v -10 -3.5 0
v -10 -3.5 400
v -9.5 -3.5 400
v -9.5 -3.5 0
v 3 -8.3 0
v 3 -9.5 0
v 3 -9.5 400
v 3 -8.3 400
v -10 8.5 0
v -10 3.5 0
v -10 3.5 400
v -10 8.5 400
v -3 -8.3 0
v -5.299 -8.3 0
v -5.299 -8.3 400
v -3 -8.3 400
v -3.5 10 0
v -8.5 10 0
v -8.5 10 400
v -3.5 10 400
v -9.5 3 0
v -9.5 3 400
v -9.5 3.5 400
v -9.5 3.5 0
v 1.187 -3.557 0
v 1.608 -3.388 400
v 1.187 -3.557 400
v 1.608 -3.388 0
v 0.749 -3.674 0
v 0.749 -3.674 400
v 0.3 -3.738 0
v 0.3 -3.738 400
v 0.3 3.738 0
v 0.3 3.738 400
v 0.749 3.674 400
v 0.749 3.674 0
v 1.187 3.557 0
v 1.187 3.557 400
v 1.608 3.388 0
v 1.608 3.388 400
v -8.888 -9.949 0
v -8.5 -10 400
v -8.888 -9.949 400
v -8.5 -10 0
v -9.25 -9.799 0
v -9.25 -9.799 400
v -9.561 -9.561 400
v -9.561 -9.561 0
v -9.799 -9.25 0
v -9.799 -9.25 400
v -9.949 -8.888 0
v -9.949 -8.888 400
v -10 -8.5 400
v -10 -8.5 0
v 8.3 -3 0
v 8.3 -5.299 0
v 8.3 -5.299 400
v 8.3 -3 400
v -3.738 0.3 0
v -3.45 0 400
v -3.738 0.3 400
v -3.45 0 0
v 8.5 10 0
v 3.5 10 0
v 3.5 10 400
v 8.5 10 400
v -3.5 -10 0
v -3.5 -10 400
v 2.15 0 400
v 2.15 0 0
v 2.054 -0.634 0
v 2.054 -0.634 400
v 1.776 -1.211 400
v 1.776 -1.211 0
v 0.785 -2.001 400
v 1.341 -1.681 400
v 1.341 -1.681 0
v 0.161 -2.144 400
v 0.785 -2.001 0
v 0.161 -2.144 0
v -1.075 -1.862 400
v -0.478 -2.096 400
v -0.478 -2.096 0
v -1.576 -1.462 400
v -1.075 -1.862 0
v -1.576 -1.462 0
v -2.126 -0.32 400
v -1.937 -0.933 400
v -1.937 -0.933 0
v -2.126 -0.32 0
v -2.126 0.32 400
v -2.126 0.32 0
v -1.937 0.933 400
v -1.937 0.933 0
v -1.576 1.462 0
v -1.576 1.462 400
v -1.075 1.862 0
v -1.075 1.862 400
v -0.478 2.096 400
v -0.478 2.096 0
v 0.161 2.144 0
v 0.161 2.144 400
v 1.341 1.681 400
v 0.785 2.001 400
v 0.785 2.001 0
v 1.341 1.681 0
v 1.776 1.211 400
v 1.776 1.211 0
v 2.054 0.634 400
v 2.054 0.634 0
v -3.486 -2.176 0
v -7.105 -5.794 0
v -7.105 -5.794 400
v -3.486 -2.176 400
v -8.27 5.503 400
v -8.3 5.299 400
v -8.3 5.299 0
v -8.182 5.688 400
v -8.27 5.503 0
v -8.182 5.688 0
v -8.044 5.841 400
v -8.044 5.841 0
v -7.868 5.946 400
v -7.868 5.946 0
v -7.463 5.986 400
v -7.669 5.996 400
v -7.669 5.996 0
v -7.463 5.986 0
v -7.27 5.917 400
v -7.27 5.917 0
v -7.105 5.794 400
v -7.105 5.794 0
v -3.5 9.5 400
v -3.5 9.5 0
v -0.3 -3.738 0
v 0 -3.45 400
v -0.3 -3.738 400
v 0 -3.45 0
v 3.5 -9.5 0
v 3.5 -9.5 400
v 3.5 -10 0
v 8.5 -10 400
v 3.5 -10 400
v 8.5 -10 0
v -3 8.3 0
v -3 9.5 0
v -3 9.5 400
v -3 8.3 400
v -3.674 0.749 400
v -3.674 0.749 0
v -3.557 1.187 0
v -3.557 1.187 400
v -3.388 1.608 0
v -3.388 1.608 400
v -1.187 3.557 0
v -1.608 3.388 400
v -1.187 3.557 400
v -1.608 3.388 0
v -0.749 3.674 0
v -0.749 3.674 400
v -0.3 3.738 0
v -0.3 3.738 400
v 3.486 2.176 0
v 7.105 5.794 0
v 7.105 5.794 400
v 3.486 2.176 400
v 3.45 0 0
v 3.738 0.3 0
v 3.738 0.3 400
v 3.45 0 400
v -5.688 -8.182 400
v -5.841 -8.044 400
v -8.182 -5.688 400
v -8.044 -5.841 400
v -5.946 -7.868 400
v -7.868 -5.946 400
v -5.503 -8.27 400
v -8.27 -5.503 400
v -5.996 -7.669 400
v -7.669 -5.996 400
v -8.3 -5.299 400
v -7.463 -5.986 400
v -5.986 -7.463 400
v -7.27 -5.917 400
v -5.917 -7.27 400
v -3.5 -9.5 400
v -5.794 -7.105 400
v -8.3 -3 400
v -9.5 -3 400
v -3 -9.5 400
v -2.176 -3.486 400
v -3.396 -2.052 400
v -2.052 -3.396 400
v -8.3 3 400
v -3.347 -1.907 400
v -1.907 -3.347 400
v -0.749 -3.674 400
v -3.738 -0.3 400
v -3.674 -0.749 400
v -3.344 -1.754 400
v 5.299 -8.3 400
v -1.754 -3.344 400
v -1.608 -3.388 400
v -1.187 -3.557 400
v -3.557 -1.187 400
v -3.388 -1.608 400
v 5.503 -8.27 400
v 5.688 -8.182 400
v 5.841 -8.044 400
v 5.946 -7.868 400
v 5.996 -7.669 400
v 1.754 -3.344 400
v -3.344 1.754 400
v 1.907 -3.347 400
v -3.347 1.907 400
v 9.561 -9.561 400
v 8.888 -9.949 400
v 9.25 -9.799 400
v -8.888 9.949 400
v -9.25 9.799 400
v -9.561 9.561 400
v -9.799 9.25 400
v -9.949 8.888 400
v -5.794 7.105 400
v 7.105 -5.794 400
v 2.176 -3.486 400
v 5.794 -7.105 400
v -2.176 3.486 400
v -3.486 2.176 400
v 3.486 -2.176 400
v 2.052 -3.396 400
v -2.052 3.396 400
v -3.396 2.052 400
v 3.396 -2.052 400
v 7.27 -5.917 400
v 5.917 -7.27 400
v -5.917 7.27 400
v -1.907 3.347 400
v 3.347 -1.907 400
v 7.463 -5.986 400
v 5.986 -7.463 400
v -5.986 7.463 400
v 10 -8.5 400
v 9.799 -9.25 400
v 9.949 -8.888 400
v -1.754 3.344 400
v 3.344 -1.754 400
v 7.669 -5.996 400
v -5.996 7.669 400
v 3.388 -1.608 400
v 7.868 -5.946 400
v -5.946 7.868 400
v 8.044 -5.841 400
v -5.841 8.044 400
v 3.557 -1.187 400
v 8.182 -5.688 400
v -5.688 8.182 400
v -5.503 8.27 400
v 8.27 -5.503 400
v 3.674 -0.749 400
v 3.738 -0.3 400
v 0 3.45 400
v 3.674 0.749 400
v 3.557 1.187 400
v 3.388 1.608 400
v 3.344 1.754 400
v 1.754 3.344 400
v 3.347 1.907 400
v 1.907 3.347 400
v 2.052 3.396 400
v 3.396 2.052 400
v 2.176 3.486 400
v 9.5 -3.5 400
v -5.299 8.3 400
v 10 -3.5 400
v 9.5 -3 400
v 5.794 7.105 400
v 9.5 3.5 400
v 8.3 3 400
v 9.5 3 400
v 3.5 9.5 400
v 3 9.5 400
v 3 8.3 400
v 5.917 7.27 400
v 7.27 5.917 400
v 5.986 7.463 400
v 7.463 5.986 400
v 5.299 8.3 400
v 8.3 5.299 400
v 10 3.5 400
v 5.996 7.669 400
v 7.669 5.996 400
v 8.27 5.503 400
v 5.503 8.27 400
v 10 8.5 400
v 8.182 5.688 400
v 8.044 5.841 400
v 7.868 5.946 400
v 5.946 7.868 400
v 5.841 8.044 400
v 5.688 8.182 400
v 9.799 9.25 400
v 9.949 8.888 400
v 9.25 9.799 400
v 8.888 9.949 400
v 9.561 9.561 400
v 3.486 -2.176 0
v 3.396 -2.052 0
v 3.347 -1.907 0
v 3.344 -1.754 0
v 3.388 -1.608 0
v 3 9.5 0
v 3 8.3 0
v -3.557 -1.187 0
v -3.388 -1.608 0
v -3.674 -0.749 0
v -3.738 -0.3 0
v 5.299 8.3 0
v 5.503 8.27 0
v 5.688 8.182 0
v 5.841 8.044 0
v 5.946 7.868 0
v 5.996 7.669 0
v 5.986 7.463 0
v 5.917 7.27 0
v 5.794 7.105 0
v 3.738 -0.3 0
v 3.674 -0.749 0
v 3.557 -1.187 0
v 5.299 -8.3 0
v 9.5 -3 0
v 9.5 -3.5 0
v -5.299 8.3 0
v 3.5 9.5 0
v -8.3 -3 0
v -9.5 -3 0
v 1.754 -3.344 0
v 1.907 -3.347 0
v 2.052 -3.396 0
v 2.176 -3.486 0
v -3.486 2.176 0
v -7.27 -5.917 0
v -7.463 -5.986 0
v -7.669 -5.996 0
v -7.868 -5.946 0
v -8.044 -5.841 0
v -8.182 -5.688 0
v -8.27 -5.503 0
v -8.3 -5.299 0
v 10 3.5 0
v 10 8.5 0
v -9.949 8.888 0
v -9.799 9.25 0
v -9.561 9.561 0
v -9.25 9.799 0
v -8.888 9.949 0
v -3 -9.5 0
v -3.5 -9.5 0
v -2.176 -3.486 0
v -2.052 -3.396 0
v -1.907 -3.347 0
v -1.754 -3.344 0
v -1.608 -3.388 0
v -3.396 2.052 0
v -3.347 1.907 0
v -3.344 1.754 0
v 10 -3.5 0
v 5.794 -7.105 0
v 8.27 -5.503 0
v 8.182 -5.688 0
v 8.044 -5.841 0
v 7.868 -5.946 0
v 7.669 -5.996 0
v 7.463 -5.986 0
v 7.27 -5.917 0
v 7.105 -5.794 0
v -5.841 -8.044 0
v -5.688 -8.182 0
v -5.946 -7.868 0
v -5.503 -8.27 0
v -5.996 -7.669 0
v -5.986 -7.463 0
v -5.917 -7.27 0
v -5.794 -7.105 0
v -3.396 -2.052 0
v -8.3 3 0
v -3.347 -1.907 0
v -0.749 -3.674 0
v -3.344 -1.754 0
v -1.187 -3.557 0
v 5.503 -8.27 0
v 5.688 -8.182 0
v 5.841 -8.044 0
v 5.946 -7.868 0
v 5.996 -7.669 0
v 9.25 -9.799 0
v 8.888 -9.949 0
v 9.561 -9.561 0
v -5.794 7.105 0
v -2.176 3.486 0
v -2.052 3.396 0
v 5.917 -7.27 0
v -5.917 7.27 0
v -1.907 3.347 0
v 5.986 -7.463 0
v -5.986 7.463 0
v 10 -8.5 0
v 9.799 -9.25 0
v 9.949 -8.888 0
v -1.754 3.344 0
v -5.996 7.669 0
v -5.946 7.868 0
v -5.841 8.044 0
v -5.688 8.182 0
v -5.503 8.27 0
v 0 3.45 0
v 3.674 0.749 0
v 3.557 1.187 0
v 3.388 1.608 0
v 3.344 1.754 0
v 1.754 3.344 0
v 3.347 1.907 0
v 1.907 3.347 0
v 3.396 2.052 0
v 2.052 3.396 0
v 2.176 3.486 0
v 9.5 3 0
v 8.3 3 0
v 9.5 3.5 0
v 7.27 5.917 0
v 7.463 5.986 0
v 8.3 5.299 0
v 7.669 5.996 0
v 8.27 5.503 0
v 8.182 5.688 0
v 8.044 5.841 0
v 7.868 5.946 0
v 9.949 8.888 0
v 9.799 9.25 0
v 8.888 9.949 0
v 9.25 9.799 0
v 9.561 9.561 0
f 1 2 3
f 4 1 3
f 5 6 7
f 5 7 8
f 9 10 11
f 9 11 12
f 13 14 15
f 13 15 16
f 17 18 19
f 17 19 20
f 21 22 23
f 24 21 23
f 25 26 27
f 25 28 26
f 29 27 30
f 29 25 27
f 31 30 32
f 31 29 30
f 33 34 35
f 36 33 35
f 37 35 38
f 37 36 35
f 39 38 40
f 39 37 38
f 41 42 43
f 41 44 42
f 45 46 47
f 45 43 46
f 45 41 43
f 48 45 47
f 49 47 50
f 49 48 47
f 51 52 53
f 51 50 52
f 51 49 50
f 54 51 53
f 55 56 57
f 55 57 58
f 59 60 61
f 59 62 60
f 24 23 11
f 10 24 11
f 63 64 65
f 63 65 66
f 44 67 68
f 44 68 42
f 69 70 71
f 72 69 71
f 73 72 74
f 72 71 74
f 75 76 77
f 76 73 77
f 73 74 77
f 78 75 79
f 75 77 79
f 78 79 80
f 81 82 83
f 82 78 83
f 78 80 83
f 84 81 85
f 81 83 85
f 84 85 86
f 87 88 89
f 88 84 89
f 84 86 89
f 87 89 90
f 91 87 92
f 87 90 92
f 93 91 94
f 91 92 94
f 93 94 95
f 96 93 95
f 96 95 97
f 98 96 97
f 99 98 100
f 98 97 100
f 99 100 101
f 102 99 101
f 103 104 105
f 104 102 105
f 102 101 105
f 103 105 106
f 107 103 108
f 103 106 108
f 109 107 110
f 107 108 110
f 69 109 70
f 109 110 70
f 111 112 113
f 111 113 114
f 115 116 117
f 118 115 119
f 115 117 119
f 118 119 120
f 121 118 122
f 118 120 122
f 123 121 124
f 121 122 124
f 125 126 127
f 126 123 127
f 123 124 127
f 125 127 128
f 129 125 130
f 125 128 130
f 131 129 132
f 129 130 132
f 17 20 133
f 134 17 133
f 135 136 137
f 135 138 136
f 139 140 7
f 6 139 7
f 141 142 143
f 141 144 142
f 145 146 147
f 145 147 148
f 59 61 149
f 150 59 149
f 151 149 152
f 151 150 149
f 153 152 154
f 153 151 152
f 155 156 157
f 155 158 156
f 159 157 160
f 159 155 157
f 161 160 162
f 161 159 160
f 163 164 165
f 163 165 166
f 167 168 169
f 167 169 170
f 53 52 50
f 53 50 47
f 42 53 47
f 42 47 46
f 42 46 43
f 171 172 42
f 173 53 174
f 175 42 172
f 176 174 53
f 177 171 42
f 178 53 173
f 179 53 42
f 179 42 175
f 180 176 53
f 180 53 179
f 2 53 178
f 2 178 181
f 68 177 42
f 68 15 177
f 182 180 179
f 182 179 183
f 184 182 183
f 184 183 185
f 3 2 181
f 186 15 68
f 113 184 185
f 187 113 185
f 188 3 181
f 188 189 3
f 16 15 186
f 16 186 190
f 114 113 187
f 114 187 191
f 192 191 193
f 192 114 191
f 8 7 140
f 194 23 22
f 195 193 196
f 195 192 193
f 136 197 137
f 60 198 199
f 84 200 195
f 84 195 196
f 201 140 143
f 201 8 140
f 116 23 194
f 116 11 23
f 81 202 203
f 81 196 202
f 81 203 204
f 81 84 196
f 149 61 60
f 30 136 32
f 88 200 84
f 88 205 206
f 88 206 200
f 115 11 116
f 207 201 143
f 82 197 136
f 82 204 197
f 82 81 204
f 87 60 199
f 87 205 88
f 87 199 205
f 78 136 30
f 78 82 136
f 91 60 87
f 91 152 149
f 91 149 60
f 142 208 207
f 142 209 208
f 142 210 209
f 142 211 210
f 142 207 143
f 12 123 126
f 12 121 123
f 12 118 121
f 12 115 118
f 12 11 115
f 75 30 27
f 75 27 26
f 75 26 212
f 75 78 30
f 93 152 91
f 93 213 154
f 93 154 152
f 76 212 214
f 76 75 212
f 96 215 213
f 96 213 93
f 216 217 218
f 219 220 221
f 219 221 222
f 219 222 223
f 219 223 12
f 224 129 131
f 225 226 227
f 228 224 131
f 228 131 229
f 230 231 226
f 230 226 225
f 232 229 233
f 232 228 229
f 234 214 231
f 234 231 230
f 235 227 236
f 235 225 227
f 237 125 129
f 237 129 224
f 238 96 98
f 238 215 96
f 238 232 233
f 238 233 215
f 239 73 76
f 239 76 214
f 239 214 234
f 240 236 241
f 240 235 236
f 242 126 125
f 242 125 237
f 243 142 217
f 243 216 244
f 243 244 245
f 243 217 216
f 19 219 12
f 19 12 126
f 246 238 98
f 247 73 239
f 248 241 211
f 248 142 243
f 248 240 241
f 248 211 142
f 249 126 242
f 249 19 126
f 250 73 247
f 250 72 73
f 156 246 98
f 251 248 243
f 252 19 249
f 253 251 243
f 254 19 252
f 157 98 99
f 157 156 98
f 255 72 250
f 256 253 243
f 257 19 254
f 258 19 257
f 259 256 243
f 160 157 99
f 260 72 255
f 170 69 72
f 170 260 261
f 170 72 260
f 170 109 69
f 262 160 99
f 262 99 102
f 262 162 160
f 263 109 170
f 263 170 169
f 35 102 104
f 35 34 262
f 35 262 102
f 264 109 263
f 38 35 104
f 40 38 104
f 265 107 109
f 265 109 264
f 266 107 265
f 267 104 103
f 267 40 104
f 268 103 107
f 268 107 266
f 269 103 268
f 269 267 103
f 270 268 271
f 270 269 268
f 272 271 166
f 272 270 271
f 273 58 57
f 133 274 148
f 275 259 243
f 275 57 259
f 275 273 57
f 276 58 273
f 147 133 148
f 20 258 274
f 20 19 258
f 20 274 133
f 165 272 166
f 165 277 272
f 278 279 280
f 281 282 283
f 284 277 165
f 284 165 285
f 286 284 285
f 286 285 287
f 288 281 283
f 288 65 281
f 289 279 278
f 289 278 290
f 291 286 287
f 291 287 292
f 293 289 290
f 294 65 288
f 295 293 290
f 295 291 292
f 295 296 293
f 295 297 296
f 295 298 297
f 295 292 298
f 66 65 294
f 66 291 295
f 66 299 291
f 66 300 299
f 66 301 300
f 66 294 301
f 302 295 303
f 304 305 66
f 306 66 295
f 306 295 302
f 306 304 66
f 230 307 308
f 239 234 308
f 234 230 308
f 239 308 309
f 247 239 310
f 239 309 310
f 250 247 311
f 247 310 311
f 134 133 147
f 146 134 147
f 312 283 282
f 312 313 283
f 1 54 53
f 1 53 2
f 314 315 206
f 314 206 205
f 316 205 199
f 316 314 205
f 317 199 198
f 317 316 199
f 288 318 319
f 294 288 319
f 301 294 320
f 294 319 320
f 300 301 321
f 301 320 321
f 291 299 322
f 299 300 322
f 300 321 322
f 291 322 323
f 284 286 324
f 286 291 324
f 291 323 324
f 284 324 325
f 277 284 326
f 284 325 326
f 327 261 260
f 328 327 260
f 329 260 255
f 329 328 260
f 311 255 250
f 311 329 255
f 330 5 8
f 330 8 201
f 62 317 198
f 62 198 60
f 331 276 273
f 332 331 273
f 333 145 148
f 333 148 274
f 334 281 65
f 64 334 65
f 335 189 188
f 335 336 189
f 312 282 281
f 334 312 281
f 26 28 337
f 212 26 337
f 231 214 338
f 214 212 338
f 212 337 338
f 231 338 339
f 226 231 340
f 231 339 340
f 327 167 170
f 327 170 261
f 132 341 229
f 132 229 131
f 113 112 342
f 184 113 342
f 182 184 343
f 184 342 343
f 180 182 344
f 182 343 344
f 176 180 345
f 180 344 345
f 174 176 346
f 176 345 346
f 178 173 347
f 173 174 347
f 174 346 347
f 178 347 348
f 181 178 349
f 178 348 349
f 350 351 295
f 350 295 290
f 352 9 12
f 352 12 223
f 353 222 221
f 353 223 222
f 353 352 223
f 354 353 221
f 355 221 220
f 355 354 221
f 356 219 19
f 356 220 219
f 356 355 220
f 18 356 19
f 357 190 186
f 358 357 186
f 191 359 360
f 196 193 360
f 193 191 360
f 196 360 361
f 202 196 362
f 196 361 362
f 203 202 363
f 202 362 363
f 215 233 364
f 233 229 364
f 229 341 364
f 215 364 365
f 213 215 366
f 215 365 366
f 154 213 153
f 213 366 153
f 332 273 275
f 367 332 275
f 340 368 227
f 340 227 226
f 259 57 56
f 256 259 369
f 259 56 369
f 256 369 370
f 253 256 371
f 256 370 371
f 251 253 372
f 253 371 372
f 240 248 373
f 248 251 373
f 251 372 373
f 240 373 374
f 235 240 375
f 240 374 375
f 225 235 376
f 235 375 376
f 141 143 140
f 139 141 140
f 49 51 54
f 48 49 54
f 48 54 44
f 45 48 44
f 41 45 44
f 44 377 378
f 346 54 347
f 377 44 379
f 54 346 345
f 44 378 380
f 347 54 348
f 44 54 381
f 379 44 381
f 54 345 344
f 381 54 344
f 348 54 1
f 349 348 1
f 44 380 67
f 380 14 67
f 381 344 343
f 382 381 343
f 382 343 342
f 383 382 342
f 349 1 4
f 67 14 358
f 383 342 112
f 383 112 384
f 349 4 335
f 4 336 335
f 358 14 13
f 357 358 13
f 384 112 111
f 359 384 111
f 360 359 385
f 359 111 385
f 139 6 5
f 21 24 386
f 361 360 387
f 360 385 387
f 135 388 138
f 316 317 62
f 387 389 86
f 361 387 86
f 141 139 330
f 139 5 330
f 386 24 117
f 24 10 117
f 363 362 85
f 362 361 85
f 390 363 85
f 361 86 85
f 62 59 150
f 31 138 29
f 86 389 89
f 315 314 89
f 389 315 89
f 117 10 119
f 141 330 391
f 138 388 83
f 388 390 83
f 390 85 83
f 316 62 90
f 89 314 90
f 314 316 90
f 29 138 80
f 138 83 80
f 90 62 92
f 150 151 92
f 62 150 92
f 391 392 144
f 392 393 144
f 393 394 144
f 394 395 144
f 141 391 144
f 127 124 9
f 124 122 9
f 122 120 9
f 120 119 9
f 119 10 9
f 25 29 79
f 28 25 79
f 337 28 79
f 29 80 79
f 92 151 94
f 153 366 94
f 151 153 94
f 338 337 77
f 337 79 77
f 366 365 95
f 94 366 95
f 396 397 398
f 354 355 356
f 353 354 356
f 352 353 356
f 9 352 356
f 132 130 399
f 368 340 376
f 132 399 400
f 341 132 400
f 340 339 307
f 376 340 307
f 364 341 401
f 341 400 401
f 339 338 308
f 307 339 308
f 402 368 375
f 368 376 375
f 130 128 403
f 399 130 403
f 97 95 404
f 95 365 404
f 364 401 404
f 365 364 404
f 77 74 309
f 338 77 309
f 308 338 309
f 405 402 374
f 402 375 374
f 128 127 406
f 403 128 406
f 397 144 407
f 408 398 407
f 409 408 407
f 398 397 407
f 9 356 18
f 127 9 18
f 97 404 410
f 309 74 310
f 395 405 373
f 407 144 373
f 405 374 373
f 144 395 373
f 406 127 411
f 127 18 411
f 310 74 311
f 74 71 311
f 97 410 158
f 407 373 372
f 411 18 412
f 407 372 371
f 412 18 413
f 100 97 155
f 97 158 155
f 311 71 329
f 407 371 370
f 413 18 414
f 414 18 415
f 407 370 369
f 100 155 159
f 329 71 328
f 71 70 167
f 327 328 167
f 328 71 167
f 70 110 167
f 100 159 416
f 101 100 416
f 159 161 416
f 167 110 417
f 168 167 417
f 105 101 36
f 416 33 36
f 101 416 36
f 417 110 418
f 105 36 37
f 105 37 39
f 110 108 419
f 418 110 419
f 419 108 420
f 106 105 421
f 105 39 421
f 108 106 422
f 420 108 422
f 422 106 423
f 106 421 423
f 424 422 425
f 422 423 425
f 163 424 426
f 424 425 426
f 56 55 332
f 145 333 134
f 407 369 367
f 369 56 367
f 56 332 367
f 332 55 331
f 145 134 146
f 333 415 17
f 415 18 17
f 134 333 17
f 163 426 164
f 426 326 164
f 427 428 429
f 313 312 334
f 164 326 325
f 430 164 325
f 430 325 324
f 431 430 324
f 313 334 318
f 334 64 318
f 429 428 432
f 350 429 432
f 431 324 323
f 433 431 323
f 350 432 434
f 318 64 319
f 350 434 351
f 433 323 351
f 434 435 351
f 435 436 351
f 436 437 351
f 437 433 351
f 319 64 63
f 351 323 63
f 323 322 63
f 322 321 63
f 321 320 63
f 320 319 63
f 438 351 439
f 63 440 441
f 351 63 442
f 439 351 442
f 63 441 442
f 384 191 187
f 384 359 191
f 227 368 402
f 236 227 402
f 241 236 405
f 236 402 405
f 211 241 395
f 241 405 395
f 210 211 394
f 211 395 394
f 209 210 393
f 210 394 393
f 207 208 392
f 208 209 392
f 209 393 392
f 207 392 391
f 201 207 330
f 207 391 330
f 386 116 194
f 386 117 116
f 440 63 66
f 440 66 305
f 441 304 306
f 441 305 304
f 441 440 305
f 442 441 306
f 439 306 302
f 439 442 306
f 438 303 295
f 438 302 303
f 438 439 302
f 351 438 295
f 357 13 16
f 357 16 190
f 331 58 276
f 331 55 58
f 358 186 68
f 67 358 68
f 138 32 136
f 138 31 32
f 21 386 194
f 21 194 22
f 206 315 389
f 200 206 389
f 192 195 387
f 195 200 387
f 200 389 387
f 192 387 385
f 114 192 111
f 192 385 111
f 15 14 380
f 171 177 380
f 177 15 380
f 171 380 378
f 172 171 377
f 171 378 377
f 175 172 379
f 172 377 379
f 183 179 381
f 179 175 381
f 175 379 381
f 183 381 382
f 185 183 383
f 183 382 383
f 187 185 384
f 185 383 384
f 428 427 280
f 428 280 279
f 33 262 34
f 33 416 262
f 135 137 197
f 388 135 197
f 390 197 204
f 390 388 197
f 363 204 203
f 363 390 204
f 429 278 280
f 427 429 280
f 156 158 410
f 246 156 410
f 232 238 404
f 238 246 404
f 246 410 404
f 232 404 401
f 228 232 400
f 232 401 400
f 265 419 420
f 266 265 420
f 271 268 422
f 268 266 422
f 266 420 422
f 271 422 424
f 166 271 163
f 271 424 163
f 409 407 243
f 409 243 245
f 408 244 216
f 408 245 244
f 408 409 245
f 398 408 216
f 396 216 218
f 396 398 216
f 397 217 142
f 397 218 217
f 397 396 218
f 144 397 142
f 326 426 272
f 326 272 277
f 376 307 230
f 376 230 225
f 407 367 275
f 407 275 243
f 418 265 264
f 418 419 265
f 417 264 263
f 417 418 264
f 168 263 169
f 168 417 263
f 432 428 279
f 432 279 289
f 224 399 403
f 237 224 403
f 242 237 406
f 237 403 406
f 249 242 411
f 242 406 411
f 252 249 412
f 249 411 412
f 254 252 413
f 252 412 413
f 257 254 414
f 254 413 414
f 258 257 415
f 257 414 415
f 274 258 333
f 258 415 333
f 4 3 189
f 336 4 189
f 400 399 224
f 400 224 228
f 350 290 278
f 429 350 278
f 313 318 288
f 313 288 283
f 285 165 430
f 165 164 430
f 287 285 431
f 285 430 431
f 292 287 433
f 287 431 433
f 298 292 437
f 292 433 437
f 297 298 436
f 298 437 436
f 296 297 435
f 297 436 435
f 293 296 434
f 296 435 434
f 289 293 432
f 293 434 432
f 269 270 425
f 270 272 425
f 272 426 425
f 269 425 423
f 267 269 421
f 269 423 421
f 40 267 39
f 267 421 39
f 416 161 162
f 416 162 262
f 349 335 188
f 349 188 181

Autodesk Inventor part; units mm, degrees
ref_plane "YZ Plane" through (0, 0, 0) normal (1, 0, 0) x (0, 1, 0)
ref_plane "XZ Plane" through (0, 0, 0) normal (0, 1, 0) x (-1, 0, 0)
ref_plane "XY Plane" through (0, 0, 0) normal (0, 0, 1) x (1, 0, 0)
sketch "Skizze1" plane through (0, 0, 0) normal (0, 0, 1) x (1, 0, 0)
  circle A0 centre (0, 0) radius 2.15
  line L0 (-3.5, -9.5) -> (-3.5, -10)
  line L1 (-3, -9.5) -> (-3.5, -9.5)
  line L2 (-3, -8.3) -> (-3, -9.5)
  line L3 (-5.2994, -8.3) -> (-3, -8.3)
  arc A1 (-5.7944, -7.105) -> (-5.2994, -8.3) centre (-5.2994, -7.6) ccw
  line L4 (-2.1755, -3.4861) -> (-5.7944, -7.105)
  arc A2 (-1.6076, -3.388) -> (-2.1755, -3.4861) centre (-1.8219, -3.8397) ccw
  arc A3 (-1.6076, -3.388) -> (-0.3, -3.738) centre (0, 0) ccw
  line L5 (0, -3.45) -> (-0.3, -3.738)
  line L6 (0.3, -3.738) -> (0, -3.45)
  arc A4 (0.3, -3.738) -> (1.6076, -3.388) centre (0, 0) ccw
  arc A5 (2.1755, -3.4861) -> (1.6076, -3.388) centre (1.8219, -3.8397) ccw
  line L7 (5.7944, -7.105) -> (2.1755, -3.4861)
  arc A6 (5.2994, -8.3) -> (5.7944, -7.105) centre (5.2994, -7.6) ccw
  line L8 (3, -8.3) -> (5.2994, -8.3)
  line L9 (3, -9.5) -> (3, -8.3)
  line L10 (3.5, -9.5) -> (3, -9.5)
  line L11 (3.5, -10) -> (3.5, -9.5)
  line L12 (8.5, -10) -> (3.5, -10)
  arc A7 (8.5, -10) -> (10, -8.5) centre (8.5, -8.5) ccw
  line L13 (10, -3.5) -> (10, -8.5)
  line L14 (9.5, -3.5) -> (10, -3.5)
  line L15 (9.5, -3) -> (9.5, -3.5)
  line L16 (8.3, -3) -> (9.5, -3)
  line L17 (8.3, -5.2994) -> (8.3, -3)
  arc A8 (7.105, -5.7944) -> (8.3, -5.2994) centre (7.6, -5.2994) ccw
  line L18 (3.4861, -2.1755) -> (7.105, -5.7944)
  arc A9 (3.388, -1.6076) -> (3.4861, -2.1755) centre (3.8397, -1.8219) ccw
  arc A10 (3.388, -1.6076) -> (3.738, -0.3) centre (0, 0) ccw
  line L19 (3.45, 0) -> (3.738, -0.3)
  line L20 (3.738, 0.3) -> (3.45, 0)
  arc A11 (3.738, 0.3) -> (3.388, 1.6076) centre (0, 0) ccw
  arc A12 (3.4861, 2.1755) -> (3.388, 1.6076) centre (3.8397, 1.8219) ccw
  line L21 (7.105, 5.7944) -> (3.4861, 2.1755)
  arc A13 (8.3, 5.2994) -> (7.105, 5.7944) centre (7.6, 5.2994) ccw
  line L22 (8.3, 3) -> (8.3, 5.2994)
  line L23 (9.5, 3) -> (8.3, 3)
  line L24 (9.5, 3.5) -> (9.5, 3)
  line L25 (10, 3.5) -> (9.5, 3.5)
  line L26 (10, 8.5) -> (10, 3.5)
  arc A14 (10, 8.5) -> (8.5, 10) centre (8.5, 8.5) ccw
  line L27 (3.5, 10) -> (8.5, 10)
  line L28 (3.5, 9.5) -> (3.5, 10)
  line L29 (3, 9.5) -> (3.5, 9.5)
  line L30 (3, 8.3) -> (3, 9.5)
  line L31 (5.2994, 8.3) -> (3, 8.3)
  arc A15 (5.7944, 7.105) -> (5.2994, 8.3) centre (5.2994, 7.6) ccw
  line L32 (2.1755, 3.4861) -> (5.7944, 7.105)
  arc A16 (1.6076, 3.388) -> (2.1755, 3.4861) centre (1.8219, 3.8397) ccw
  arc A17 (1.6076, 3.388) -> (0.3, 3.738) centre (0, 0) ccw
  line L33 (0, 3.45) -> (0.3, 3.738)
  line L34 (-0.3, 3.738) -> (0, 3.45)
  arc A18 (-0.3, 3.738) -> (-1.6076, 3.388) centre (0, 0) ccw
  arc A19 (-2.1755, 3.4861) -> (-1.6076, 3.388) centre (-1.8219, 3.8397) ccw
  line L35 (-5.7944, 7.105) -> (-2.1755, 3.4861)
  arc A20 (-5.2994, 8.3) -> (-5.7944, 7.105) centre (-5.2994, 7.6) ccw
  line L36 (-3, 8.3) -> (-5.2994, 8.3)
  line L37 (-3, 9.5) -> (-3, 8.3)
  line L38 (-3.5, 9.5) -> (-3, 9.5)
  line L39 (-3.5, 10) -> (-3.5, 9.5)
  line L40 (-8.5, 10) -> (-3.5, 10)
  arc A21 (-8.5, 10) -> (-10, 8.5) centre (-8.5, 8.5) ccw
  line L41 (-10, 3.5) -> (-10, 8.5)
  line L42 (-9.5, 3.5) -> (-10, 3.5)
  line L43 (-9.5, 3) -> (-9.5, 3.5)
  line L44 (-8.3, 3) -> (-9.5, 3)
  line L45 (-8.3, 5.2994) -> (-8.3, 3)
  arc A22 (-7.105, 5.7944) -> (-8.3, 5.2994) centre (-7.6, 5.2994) ccw
  line L46 (-3.4861, 2.1755) -> (-7.105, 5.7944)
  arc A23 (-3.388, 1.6076) -> (-3.4861, 2.1755) centre (-3.8397, 1.8219) ccw
  arc A24 (-3.388, 1.6076) -> (-3.738, 0.3) centre (0, 0) ccw
  line L47 (-3.45, 0) -> (-3.738, 0.3)
  line L48 (-3.738, -0.3) -> (-3.45, 0)
  arc A25 (-3.738, -0.3) -> (-3.388, -1.6076) centre (0, 0) ccw
  arc A26 (-3.4861, -2.1755) -> (-3.388, -1.6076) centre (-3.8397, -1.8219) ccw
  line L49 (-7.105, -5.7944) -> (-3.4861, -2.1755)
  arc A27 (-8.3, -5.2994) -> (-7.105, -5.7944) centre (-7.6, -5.2994) ccw
  line L50 (-8.3, -3) -> (-8.3, -5.2994)
  line L51 (-9.5, -3) -> (-8.3, -3)
  line L52 (-9.5, -3.5) -> (-9.5, -3)
  line L53 (-10, -3.5) -> (-9.5, -3.5)
  line L54 (-10, -8.5) -> (-10, -3.5)
  arc A28 (-10, -8.5) -> (-8.5, -10) centre (-8.5, -8.5) ccw
  line L55 (-3.5, -10) -> (-8.5, -10)
  point P0 (18.4588, -14.4564)
extrude "Extrusion1" add sketch "Skizze1" along normal blind 400
properties part number "400mm" material "Aluminium 6061"
